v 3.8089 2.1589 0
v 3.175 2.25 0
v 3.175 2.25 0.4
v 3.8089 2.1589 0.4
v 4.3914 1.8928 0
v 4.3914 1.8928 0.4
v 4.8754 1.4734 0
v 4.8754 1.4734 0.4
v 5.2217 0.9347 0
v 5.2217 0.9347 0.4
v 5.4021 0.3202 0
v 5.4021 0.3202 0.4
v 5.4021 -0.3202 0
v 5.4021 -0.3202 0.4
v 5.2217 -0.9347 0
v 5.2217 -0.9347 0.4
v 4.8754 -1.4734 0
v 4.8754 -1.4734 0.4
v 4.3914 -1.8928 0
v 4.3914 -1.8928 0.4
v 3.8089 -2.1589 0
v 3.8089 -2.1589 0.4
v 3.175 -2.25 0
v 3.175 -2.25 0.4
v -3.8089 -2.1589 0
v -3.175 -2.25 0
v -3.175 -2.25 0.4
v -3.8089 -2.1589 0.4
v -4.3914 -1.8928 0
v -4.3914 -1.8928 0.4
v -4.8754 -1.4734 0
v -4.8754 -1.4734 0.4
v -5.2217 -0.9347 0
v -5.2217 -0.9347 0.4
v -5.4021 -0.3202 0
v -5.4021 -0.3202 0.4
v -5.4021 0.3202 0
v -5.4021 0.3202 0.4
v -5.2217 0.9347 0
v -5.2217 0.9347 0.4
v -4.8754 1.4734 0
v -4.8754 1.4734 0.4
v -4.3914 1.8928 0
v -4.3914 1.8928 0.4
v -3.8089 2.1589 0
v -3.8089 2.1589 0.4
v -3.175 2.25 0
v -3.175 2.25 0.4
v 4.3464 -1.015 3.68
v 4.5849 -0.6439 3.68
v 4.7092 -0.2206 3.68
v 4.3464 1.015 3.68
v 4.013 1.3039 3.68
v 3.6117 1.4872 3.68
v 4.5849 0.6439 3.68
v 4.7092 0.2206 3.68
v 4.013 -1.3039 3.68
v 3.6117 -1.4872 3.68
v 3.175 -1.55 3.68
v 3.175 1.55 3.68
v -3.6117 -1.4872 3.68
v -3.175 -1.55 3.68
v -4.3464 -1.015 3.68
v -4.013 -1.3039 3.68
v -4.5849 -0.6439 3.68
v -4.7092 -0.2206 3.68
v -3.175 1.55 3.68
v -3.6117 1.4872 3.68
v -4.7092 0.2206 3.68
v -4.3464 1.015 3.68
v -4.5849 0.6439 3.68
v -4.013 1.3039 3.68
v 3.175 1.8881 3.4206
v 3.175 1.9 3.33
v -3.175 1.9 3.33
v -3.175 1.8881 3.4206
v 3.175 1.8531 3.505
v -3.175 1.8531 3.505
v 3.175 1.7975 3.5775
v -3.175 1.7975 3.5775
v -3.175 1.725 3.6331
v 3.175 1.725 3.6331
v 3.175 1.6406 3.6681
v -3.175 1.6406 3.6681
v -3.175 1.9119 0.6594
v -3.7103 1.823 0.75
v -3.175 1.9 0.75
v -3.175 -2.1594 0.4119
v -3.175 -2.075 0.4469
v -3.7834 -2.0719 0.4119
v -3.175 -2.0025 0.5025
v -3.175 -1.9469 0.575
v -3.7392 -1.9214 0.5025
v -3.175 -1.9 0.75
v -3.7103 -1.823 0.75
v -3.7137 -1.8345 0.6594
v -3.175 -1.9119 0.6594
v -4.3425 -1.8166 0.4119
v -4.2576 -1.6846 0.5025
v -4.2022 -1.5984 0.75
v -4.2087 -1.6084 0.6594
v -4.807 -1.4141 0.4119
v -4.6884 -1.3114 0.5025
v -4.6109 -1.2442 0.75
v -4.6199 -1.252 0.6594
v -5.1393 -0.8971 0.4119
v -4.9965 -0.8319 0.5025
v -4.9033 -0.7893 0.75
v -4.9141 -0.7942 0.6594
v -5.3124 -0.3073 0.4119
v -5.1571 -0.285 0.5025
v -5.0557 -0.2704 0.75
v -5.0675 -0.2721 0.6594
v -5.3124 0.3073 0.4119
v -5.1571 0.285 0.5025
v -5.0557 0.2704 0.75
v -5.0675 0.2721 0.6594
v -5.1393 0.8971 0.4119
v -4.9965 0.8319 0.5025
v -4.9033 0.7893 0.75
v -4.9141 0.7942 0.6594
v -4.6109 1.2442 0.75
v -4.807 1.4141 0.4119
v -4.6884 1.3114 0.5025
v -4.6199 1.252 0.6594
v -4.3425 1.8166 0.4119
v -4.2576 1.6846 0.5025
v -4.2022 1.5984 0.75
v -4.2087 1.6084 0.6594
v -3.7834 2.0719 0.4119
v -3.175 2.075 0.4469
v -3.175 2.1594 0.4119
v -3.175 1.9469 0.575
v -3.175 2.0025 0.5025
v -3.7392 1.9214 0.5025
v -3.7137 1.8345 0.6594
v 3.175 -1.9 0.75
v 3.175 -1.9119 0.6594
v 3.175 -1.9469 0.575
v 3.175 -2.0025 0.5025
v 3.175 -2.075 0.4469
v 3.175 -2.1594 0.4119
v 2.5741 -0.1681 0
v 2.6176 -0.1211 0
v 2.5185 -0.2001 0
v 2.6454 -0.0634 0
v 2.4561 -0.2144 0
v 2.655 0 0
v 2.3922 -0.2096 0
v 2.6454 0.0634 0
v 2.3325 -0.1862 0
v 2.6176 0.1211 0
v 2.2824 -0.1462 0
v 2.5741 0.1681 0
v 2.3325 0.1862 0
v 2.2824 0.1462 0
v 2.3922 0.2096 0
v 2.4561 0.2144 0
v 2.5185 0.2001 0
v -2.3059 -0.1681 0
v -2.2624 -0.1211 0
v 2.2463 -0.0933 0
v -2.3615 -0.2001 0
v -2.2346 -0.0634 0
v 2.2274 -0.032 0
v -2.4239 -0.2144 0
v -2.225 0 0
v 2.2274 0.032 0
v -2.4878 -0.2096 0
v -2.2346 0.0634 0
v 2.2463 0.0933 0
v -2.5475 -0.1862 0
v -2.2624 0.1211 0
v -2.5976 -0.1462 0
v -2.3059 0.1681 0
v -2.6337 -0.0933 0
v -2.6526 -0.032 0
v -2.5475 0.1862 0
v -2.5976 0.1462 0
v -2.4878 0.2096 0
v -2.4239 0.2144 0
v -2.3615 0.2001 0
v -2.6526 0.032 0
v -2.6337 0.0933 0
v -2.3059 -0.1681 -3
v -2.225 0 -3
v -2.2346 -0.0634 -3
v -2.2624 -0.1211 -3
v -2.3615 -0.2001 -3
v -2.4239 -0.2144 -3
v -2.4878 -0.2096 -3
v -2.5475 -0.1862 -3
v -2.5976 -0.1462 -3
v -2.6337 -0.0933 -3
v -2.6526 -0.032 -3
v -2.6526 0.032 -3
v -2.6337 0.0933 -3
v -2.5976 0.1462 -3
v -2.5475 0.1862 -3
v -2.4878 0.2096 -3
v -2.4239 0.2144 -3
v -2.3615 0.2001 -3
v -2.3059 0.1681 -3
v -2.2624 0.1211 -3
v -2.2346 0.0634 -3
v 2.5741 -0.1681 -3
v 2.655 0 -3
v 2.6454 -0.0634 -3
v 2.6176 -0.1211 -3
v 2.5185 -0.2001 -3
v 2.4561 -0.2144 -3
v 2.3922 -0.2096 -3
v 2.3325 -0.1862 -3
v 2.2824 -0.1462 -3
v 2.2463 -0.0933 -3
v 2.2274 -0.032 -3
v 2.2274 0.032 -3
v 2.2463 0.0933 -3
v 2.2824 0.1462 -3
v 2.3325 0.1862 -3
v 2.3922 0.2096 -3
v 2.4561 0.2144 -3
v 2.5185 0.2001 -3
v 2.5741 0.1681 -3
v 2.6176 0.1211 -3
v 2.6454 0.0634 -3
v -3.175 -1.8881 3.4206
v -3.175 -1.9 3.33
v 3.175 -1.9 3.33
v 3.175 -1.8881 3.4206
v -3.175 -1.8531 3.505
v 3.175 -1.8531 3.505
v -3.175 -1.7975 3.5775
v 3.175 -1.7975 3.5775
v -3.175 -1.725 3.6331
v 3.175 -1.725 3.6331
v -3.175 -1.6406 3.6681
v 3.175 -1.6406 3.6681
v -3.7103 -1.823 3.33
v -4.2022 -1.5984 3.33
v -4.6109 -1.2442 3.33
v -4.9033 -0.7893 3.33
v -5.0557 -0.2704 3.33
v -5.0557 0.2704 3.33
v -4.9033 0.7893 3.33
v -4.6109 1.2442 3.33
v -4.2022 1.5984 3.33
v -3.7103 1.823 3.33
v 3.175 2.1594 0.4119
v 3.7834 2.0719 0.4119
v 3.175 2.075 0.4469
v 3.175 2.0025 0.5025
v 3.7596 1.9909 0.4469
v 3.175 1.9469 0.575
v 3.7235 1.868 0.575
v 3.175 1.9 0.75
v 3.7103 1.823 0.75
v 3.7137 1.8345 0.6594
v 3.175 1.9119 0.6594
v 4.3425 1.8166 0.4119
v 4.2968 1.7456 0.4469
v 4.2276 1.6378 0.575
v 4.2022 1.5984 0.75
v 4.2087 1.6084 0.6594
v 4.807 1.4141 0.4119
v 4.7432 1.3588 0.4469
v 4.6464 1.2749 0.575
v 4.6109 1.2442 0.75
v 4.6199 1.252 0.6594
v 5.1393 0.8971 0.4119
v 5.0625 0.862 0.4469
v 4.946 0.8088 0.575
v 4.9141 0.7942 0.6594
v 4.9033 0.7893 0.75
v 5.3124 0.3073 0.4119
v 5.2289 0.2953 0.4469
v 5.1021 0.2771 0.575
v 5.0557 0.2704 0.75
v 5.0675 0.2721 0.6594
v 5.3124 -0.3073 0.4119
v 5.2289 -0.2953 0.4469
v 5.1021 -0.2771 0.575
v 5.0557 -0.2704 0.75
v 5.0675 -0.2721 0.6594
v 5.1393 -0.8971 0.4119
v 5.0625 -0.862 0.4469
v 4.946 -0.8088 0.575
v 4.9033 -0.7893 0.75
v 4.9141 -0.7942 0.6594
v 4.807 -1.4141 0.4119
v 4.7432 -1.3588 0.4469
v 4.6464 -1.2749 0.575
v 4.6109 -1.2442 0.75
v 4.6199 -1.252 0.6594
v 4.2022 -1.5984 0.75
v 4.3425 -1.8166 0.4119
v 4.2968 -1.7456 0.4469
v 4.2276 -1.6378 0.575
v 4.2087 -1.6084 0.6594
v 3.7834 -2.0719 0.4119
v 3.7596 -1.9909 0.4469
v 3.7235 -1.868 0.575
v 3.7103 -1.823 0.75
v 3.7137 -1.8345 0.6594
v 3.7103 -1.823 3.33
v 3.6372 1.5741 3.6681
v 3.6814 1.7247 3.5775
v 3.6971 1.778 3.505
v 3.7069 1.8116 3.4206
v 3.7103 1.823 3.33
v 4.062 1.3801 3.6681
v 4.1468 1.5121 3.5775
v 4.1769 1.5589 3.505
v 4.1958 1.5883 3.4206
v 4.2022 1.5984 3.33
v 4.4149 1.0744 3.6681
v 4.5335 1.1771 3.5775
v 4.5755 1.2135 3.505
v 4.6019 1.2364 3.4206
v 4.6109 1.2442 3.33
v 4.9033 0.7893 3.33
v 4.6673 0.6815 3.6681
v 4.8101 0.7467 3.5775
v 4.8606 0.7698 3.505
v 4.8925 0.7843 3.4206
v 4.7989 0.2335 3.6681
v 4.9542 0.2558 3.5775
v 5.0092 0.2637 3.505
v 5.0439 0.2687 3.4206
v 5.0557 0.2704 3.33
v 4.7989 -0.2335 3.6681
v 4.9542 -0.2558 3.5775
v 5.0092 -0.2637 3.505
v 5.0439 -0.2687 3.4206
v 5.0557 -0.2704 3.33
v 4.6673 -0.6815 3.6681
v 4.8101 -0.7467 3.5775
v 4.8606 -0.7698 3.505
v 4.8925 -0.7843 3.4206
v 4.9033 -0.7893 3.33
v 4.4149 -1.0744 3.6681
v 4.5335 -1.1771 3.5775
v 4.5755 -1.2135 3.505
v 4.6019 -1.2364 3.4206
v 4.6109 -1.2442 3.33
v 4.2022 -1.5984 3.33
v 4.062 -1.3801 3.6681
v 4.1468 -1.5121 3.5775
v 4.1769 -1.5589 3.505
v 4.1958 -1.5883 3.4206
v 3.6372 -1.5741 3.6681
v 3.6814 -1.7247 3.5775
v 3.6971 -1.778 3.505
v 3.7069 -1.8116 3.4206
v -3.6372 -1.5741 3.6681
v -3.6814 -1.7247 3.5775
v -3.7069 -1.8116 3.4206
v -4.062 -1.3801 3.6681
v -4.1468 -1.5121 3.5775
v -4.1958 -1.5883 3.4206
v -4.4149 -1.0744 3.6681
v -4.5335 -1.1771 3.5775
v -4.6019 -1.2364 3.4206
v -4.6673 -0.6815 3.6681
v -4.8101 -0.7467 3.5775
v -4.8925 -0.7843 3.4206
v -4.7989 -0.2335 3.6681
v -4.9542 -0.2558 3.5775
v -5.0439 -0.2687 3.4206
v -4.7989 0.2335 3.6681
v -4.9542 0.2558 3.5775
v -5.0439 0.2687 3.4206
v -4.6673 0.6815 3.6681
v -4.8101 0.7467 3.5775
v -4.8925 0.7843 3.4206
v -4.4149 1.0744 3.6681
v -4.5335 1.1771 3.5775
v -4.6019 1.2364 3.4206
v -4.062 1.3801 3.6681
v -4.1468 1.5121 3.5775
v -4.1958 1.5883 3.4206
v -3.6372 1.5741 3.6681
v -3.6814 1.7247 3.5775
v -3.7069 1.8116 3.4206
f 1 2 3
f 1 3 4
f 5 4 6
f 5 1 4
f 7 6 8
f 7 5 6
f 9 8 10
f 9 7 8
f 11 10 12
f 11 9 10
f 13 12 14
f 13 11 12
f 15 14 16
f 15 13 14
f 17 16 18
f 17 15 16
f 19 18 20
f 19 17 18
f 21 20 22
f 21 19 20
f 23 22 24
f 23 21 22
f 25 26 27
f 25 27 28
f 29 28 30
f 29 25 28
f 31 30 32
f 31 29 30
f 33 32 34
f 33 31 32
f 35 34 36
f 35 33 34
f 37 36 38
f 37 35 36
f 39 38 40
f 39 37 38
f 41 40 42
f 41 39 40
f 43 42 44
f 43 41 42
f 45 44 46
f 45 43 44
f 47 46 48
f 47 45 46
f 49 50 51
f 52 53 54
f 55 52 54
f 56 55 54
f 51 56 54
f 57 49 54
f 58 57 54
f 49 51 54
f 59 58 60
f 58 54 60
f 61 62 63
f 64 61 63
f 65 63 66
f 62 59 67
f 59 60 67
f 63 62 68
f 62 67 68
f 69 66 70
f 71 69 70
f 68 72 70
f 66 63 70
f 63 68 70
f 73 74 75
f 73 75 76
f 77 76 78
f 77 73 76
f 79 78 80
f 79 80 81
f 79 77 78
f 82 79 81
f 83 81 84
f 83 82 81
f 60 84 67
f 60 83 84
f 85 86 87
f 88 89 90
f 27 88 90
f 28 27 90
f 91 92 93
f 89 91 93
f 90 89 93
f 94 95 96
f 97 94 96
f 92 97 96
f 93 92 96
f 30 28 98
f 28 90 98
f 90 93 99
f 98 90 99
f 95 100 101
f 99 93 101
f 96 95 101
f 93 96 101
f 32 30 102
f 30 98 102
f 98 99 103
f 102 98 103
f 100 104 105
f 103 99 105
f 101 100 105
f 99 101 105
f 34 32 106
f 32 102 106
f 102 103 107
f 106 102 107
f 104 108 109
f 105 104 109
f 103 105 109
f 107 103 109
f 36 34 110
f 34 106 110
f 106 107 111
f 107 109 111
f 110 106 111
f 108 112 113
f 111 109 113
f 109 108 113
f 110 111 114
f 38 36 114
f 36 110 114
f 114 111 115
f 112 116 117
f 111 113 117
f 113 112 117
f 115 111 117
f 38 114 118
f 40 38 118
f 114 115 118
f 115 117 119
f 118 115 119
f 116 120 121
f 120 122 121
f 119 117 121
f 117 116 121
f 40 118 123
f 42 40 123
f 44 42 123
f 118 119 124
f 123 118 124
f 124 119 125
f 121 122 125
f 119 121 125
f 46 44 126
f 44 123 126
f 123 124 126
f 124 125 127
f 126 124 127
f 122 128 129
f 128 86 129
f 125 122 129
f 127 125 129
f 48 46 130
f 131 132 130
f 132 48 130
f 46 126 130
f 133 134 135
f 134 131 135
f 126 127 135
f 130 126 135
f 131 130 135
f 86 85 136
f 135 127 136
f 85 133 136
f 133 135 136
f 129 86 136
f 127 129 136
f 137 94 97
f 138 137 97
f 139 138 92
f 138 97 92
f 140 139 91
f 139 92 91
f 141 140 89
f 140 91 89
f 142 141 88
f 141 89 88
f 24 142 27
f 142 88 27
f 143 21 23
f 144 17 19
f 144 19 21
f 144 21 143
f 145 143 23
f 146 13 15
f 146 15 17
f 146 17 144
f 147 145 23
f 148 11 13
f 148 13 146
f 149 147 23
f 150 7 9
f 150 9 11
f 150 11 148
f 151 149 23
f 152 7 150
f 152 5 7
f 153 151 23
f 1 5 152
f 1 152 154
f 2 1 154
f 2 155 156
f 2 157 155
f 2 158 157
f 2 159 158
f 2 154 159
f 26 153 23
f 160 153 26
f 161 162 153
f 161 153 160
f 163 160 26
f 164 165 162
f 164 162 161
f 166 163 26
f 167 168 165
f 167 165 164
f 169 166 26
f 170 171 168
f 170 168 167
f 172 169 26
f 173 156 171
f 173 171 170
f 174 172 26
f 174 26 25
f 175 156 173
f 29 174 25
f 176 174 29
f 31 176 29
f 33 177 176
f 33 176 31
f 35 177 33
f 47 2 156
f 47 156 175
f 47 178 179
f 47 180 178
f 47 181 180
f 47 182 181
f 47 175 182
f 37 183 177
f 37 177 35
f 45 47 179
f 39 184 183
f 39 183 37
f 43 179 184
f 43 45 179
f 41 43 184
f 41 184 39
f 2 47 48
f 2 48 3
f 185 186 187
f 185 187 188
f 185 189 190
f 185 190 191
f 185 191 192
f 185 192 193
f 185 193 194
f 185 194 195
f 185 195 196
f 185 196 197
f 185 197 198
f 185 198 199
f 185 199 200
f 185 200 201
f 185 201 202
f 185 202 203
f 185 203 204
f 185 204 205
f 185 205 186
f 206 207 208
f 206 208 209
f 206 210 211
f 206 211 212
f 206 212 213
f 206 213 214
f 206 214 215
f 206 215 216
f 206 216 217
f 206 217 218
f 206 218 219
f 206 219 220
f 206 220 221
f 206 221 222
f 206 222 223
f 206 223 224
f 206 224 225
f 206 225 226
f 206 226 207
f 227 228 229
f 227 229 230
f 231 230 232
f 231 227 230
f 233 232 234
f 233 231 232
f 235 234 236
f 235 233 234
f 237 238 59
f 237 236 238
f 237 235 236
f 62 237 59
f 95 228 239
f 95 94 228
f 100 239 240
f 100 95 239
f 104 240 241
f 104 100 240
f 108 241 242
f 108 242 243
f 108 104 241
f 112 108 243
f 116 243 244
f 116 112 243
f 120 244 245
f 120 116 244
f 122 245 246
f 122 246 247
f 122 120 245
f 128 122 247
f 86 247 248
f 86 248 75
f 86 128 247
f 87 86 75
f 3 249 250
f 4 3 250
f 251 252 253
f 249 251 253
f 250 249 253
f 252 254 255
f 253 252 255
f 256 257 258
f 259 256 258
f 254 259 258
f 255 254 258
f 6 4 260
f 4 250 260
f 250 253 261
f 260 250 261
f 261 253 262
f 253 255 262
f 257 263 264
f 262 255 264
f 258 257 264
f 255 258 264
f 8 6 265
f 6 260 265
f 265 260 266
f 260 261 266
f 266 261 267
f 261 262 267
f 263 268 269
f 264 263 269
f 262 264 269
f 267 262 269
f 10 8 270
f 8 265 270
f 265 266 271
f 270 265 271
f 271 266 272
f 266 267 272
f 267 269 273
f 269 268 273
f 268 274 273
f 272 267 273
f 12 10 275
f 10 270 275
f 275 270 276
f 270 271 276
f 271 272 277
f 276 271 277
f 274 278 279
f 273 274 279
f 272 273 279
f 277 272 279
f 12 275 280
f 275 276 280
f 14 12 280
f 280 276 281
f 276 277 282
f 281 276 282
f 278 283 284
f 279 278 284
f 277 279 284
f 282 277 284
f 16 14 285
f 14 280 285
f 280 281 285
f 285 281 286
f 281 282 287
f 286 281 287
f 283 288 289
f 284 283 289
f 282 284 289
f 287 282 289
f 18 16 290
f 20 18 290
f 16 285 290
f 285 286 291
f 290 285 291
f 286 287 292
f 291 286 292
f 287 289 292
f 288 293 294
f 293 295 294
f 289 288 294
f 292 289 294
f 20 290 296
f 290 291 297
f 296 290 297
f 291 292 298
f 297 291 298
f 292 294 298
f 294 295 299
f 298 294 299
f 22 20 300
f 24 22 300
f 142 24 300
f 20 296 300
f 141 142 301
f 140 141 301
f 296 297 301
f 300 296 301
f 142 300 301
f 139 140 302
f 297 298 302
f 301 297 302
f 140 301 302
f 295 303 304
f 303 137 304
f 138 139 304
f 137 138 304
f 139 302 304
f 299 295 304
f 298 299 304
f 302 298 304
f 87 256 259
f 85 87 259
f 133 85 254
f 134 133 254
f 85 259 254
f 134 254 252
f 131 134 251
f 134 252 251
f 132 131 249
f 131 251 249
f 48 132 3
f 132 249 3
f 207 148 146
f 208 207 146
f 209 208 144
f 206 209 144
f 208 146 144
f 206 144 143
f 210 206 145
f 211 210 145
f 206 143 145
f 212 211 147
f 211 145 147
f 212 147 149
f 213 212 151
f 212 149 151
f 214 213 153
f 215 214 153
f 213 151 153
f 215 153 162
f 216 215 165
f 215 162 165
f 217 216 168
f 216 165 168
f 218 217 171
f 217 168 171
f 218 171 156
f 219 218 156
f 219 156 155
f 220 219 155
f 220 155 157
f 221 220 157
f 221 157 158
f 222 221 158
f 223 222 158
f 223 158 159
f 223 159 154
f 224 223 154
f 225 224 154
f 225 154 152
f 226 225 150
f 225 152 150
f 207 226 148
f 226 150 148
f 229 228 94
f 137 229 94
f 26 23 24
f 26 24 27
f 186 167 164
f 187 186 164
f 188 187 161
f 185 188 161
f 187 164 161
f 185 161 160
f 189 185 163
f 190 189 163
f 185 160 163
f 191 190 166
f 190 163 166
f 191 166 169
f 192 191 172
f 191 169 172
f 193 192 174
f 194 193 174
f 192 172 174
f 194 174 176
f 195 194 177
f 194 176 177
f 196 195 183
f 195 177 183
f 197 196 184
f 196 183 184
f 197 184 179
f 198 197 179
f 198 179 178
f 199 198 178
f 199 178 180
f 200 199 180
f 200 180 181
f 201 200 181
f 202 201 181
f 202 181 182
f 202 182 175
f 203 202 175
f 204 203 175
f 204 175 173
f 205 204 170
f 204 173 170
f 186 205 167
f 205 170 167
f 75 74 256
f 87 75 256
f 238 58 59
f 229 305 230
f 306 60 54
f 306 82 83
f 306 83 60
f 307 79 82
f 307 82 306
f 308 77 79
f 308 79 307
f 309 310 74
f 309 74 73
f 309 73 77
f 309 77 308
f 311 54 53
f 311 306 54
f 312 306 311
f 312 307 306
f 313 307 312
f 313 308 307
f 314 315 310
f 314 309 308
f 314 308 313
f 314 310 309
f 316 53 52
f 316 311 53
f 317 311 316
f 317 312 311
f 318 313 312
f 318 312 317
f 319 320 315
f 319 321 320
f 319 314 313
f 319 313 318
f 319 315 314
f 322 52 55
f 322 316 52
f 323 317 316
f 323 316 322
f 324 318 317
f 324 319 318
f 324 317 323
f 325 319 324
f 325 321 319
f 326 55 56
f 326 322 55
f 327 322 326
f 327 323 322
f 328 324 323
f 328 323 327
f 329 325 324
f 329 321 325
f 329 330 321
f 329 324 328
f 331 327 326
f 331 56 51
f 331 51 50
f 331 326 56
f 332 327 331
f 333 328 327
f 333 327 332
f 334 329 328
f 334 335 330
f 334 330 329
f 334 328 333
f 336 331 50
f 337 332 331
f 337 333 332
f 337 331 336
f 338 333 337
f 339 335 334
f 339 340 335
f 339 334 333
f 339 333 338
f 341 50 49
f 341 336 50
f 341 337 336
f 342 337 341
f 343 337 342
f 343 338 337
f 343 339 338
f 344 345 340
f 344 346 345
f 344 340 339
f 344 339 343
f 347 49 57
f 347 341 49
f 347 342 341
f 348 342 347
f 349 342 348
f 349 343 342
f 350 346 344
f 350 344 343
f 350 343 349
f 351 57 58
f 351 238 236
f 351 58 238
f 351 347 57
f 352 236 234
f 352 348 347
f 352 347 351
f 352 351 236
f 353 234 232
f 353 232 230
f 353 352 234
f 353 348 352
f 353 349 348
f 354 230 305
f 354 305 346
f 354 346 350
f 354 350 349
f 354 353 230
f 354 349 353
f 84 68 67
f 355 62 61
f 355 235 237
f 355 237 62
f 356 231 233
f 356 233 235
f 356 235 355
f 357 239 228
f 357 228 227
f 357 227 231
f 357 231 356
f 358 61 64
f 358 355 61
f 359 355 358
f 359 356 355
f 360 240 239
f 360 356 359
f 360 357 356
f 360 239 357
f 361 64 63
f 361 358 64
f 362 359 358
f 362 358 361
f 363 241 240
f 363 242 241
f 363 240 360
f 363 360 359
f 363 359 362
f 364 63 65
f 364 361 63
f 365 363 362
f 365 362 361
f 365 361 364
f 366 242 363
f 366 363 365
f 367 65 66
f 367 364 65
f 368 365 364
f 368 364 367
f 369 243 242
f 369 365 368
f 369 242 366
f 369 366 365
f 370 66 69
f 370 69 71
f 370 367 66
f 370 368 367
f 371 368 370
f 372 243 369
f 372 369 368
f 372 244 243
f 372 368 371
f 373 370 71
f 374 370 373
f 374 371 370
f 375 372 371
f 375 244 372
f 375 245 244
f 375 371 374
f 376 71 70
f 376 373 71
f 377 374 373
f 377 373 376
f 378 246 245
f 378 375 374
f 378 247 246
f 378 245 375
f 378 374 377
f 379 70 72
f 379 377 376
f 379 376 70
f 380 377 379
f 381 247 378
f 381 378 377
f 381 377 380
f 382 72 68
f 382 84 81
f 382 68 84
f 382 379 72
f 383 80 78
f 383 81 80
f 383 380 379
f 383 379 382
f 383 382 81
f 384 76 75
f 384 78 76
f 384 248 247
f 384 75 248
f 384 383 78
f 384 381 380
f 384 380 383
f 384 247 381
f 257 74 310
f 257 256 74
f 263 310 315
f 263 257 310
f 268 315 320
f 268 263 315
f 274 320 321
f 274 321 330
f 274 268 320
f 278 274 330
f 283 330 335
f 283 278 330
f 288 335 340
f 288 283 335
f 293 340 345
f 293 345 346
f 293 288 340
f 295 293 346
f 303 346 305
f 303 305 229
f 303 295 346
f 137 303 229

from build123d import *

# Parameters (mm, degrees)
BOSS_EXTRUDE1_DEPTH = 3.68
SKETCH4_R           = 0.215
BOSS_EXTRUDE2_DEPTH = 3


with BuildPart() as part:
    # Sketch1 → Boss-Extrude1 (new body)
    with BuildSketch(Plane.XY):
        with BuildLine():
            Line((-3.175, 2.25), (3.175, 2.25))
            ThreePointArc((3.175, 2.25), (5.425, 0), (3.175, -2.25))
            Line((3.175, -2.25), (-3.175, -2.25))
            ThreePointArc((-3.175, -2.25), (-5.425, 0), (-3.175, 2.25))
        make_face()
    extrude(amount=BOSS_EXTRUDE1_DEPTH)

    # Cut-Sweep1: sweep along a path in Sketch1<2>
    with BuildLine(Plane.XY) as cut_sweep1_path:
        Line((-3.175, 2.25), (3.175, 2.25))
        ThreePointArc((3.175, 2.25), (5.425, 0), (3.175, -2.25))
        Line((3.175, -2.25), (-3.175, -2.25))
        ThreePointArc((-3.175, -2.25), (-5.425, 0), (-3.175, 2.25))
    # Sketch2 → Cut-Sweep1 (sweep, cut)
    with BuildSketch(Plane(origin=(0, 0, 0), x_dir=(0, 0, -1), z_dir=(1, 0, 0))):
        with BuildLine():
            Line((-0.75, 1.9), (-3.33, 1.9))
            ThreePointArc((-3.33, 1.9), (-3.577487373, 1.797487373), (-3.68, 1.55))
            Line((-3.68, 1.55), (-3.68, 2.25))
            Line((-3.68, 2.25), (-0.4, 2.25))
            ThreePointArc((-0.4, 2.25), (-0.502512627, 2.002512627), (-0.75, 1.9))
        make_face()
    sweep(path=cut_sweep1_path.line, mode=Mode.SUBTRACT)

    # Sketch4 → Boss-Extrude2 (add)
    with BuildSketch(Plane(origin=(0, 0, 0), x_dir=(-1, 0, 0), z_dir=(0, 0, -1))):
        with Locations((-2.44, 0)):
            Circle(SKETCH4_R)
        with Locations((2.44, 0)):
            Circle(SKETCH4_R)
    extrude(amount=BOSS_EXTRUDE2_DEPTH)


solid = part.part
